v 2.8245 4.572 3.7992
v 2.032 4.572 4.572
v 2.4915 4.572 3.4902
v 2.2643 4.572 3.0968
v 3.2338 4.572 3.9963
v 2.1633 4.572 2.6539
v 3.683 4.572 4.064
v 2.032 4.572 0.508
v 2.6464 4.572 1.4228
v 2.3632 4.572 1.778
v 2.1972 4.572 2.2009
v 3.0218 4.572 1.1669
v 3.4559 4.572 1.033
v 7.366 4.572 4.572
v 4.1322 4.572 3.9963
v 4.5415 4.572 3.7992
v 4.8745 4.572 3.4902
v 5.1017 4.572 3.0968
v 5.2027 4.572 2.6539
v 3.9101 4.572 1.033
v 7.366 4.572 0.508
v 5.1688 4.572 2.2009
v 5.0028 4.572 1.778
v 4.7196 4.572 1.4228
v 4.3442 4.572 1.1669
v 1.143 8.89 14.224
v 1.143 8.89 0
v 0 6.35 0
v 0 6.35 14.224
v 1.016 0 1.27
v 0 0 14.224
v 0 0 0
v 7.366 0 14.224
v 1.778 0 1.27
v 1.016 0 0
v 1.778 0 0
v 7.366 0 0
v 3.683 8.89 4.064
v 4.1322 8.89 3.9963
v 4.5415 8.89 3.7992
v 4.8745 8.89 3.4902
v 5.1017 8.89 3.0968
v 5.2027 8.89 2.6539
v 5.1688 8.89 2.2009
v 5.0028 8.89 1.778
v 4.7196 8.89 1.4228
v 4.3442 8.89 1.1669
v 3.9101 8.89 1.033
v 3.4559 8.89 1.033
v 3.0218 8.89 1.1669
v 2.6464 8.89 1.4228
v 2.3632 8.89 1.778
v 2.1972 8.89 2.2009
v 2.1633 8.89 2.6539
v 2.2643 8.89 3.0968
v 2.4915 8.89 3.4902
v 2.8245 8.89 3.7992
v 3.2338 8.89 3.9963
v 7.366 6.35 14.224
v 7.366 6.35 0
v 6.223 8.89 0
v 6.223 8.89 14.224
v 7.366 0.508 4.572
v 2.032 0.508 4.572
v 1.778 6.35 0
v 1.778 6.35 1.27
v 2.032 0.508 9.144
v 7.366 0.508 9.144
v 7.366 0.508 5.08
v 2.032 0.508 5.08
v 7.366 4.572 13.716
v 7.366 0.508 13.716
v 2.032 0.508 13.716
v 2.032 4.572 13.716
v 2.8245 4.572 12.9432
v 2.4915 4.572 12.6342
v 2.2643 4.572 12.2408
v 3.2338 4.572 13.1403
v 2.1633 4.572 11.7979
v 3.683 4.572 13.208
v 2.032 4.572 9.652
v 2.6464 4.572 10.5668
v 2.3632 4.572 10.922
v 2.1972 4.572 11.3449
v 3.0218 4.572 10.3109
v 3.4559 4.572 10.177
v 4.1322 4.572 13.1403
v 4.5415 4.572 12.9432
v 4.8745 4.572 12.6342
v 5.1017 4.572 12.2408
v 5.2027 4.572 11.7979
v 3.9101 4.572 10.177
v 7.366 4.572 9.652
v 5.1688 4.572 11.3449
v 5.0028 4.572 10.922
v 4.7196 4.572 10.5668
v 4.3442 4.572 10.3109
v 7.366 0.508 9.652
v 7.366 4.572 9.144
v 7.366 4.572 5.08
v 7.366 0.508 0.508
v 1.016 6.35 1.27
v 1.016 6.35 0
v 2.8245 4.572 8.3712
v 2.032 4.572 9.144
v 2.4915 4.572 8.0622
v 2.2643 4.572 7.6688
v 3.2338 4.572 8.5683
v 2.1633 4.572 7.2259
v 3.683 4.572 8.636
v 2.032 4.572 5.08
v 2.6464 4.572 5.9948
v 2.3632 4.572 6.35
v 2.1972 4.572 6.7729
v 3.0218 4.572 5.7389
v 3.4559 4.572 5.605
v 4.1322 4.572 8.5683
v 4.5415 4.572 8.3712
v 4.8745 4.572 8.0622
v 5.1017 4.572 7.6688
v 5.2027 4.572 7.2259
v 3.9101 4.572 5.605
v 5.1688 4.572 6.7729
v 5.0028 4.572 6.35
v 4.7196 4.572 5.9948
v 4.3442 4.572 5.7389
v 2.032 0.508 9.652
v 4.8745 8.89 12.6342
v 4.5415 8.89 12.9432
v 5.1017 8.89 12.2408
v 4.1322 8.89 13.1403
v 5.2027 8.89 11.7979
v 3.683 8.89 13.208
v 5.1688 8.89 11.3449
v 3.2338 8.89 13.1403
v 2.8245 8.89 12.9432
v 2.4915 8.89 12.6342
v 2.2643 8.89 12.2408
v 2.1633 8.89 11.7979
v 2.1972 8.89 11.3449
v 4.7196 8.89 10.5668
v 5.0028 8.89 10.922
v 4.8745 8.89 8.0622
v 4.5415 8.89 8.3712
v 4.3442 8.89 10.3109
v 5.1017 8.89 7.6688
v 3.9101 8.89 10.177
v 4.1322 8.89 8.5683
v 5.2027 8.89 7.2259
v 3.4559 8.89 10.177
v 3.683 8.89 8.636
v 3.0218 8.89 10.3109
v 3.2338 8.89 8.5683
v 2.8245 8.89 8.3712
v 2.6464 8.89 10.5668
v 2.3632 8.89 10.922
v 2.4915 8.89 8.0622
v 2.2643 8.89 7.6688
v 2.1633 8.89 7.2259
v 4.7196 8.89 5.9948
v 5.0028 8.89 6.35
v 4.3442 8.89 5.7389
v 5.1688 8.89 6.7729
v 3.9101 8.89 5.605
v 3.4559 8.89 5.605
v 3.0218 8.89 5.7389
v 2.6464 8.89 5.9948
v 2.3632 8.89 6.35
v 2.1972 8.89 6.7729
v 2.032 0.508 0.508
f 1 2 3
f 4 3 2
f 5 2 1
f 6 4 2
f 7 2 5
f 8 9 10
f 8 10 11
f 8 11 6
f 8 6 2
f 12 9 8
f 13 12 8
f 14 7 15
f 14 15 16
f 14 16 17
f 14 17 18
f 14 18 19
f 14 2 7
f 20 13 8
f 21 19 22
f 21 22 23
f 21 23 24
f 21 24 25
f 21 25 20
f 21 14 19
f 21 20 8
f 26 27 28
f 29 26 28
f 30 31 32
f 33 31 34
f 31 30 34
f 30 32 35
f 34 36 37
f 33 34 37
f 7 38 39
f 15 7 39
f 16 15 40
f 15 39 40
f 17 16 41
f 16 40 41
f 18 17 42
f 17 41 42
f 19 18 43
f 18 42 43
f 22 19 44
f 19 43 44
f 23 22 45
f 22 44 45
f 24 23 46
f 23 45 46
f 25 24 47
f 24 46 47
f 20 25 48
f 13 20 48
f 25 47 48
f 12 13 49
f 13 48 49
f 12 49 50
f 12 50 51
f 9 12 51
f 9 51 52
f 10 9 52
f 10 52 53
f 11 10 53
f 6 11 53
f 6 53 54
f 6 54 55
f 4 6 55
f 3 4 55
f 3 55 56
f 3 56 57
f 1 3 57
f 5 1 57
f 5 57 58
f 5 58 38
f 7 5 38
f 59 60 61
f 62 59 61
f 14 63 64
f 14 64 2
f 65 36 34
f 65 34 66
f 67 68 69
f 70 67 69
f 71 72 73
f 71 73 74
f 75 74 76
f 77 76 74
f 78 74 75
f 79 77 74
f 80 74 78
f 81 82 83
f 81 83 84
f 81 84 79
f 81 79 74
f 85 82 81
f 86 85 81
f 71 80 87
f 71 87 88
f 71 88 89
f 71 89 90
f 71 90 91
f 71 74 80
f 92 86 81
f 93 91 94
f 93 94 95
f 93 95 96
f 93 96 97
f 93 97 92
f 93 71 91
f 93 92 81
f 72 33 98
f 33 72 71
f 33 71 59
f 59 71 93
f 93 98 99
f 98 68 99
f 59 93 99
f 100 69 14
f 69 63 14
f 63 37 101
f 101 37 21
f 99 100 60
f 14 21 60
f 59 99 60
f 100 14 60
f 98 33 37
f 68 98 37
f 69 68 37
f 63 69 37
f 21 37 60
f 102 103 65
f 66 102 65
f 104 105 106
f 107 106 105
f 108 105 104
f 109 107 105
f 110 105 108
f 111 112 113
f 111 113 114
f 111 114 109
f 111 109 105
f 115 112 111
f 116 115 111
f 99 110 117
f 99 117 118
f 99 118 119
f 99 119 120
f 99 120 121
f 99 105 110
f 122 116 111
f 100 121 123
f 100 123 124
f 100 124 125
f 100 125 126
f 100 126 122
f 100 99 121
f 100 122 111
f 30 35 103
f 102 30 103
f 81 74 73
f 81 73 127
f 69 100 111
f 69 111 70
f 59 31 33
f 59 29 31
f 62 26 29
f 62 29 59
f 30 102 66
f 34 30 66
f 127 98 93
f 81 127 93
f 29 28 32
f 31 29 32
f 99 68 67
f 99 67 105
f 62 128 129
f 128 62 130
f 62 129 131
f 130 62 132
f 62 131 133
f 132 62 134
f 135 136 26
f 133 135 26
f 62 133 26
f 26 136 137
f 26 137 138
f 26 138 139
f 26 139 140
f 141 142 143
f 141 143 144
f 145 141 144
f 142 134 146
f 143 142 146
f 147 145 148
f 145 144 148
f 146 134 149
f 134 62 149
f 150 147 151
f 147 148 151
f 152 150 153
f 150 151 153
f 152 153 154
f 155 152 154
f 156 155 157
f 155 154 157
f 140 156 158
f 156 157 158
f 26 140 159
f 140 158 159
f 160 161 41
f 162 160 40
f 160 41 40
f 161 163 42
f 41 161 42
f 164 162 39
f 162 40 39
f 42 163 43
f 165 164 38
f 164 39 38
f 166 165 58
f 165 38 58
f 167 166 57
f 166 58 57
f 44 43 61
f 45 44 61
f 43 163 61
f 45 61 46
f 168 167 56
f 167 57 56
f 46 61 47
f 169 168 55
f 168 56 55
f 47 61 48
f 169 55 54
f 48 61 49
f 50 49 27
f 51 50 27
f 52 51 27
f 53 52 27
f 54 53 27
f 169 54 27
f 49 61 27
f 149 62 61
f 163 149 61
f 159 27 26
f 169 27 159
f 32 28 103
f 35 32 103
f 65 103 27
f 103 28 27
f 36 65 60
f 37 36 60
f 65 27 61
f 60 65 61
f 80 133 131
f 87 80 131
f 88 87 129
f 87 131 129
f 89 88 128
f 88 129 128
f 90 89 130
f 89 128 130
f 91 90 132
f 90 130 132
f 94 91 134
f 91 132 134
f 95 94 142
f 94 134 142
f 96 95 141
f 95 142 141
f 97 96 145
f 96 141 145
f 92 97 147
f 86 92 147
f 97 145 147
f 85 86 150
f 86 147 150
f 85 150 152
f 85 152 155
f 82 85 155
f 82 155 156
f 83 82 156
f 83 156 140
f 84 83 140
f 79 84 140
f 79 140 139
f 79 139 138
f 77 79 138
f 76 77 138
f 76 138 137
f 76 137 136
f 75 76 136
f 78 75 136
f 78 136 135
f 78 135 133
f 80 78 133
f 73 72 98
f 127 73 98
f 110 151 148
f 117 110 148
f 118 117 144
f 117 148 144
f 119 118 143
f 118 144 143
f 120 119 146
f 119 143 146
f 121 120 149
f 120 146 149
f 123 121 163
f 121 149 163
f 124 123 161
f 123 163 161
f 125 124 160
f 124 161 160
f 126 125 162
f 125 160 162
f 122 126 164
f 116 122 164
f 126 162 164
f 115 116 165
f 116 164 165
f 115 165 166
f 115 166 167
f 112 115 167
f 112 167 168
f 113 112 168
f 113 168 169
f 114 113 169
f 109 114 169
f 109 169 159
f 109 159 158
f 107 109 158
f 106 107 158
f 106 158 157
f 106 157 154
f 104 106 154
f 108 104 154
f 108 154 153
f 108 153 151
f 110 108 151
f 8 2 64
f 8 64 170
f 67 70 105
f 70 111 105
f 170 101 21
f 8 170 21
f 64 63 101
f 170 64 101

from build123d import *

# Parameters (mm, degrees)
EXTRUDE_1_DEPTH     = 14.224
SKETCH_2_R          = 1.524
CUT_EXTRUDE_1_DEPTH = 8.382
SKETCH_3_W          = 4.064
SKETCH_3_H          = 4.064
CUT_EXTRUDE_2_DEPTH = 5.334
SKETCH_4_W          = 0.762
SKETCH_4_H          = 6.35
CUT_EXTRUDE_3_DEPTH = 1.27


with BuildPart() as part:
    # 草图1 → 凸台-拉伸1 (new body)
    with BuildSketch(Plane.XY):
        Polygon((0, 0), (7.366, 0), (7.366, 6.35), (6.223, 8.89), (1.143, 8.89), (0, 6.35), align=None)
    extrude(amount=EXTRUDE_1_DEPTH)

    # 草图2 → 切除-拉伸1 (cut)
    with BuildSketch(Plane(origin=(0, 8.89, 0), x_dir=(1, 0, 0), z_dir=(0, 1, 0))):
        with Locations(Location((3.683, -2.54, 0), (0, 0, 270))):
            Circle(SKETCH_2_R)
        with Locations(Location((3.683, -11.684, 0), (0, 0, 270))):
            Circle(SKETCH_2_R)
        with Locations(Location((3.683, -7.112, 0), (0, 0, 270))):
            Circle(SKETCH_2_R)
    extrude(amount=-CUT_EXTRUDE_1_DEPTH, mode=Mode.SUBTRACT)

    # 草图3 → 切除-拉伸2 (cut)
    with BuildSketch(Plane(origin=(7.366, 0, 0), x_dir=(0, 0, -1), z_dir=(1, 0, 0))):
        with Locations((-11.684, 2.54)):
            Rectangle(SKETCH_3_W, SKETCH_3_H)
        Polygon((-7.112, 0.508), (-9.144, 0.508), (-9.144, 4.572), (-5.08, 4.572), (-5.08, 0.508), align=None)
        with Locations((-2.54, 2.54)):
            Rectangle(SKETCH_3_W, SKETCH_3_H)
    extrude(amount=-CUT_EXTRUDE_2_DEPTH, mode=Mode.SUBTRACT)

    # 草图4 → 切除-拉伸3 (cut)
    with BuildSketch(Plane.XY):
        with Locations((1.397, 3.175)):
            Rectangle(SKETCH_4_W, SKETCH_4_H)
    extrude(amount=CUT_EXTRUDE_3_DEPTH, mode=Mode.SUBTRACT)


solid = part.part
